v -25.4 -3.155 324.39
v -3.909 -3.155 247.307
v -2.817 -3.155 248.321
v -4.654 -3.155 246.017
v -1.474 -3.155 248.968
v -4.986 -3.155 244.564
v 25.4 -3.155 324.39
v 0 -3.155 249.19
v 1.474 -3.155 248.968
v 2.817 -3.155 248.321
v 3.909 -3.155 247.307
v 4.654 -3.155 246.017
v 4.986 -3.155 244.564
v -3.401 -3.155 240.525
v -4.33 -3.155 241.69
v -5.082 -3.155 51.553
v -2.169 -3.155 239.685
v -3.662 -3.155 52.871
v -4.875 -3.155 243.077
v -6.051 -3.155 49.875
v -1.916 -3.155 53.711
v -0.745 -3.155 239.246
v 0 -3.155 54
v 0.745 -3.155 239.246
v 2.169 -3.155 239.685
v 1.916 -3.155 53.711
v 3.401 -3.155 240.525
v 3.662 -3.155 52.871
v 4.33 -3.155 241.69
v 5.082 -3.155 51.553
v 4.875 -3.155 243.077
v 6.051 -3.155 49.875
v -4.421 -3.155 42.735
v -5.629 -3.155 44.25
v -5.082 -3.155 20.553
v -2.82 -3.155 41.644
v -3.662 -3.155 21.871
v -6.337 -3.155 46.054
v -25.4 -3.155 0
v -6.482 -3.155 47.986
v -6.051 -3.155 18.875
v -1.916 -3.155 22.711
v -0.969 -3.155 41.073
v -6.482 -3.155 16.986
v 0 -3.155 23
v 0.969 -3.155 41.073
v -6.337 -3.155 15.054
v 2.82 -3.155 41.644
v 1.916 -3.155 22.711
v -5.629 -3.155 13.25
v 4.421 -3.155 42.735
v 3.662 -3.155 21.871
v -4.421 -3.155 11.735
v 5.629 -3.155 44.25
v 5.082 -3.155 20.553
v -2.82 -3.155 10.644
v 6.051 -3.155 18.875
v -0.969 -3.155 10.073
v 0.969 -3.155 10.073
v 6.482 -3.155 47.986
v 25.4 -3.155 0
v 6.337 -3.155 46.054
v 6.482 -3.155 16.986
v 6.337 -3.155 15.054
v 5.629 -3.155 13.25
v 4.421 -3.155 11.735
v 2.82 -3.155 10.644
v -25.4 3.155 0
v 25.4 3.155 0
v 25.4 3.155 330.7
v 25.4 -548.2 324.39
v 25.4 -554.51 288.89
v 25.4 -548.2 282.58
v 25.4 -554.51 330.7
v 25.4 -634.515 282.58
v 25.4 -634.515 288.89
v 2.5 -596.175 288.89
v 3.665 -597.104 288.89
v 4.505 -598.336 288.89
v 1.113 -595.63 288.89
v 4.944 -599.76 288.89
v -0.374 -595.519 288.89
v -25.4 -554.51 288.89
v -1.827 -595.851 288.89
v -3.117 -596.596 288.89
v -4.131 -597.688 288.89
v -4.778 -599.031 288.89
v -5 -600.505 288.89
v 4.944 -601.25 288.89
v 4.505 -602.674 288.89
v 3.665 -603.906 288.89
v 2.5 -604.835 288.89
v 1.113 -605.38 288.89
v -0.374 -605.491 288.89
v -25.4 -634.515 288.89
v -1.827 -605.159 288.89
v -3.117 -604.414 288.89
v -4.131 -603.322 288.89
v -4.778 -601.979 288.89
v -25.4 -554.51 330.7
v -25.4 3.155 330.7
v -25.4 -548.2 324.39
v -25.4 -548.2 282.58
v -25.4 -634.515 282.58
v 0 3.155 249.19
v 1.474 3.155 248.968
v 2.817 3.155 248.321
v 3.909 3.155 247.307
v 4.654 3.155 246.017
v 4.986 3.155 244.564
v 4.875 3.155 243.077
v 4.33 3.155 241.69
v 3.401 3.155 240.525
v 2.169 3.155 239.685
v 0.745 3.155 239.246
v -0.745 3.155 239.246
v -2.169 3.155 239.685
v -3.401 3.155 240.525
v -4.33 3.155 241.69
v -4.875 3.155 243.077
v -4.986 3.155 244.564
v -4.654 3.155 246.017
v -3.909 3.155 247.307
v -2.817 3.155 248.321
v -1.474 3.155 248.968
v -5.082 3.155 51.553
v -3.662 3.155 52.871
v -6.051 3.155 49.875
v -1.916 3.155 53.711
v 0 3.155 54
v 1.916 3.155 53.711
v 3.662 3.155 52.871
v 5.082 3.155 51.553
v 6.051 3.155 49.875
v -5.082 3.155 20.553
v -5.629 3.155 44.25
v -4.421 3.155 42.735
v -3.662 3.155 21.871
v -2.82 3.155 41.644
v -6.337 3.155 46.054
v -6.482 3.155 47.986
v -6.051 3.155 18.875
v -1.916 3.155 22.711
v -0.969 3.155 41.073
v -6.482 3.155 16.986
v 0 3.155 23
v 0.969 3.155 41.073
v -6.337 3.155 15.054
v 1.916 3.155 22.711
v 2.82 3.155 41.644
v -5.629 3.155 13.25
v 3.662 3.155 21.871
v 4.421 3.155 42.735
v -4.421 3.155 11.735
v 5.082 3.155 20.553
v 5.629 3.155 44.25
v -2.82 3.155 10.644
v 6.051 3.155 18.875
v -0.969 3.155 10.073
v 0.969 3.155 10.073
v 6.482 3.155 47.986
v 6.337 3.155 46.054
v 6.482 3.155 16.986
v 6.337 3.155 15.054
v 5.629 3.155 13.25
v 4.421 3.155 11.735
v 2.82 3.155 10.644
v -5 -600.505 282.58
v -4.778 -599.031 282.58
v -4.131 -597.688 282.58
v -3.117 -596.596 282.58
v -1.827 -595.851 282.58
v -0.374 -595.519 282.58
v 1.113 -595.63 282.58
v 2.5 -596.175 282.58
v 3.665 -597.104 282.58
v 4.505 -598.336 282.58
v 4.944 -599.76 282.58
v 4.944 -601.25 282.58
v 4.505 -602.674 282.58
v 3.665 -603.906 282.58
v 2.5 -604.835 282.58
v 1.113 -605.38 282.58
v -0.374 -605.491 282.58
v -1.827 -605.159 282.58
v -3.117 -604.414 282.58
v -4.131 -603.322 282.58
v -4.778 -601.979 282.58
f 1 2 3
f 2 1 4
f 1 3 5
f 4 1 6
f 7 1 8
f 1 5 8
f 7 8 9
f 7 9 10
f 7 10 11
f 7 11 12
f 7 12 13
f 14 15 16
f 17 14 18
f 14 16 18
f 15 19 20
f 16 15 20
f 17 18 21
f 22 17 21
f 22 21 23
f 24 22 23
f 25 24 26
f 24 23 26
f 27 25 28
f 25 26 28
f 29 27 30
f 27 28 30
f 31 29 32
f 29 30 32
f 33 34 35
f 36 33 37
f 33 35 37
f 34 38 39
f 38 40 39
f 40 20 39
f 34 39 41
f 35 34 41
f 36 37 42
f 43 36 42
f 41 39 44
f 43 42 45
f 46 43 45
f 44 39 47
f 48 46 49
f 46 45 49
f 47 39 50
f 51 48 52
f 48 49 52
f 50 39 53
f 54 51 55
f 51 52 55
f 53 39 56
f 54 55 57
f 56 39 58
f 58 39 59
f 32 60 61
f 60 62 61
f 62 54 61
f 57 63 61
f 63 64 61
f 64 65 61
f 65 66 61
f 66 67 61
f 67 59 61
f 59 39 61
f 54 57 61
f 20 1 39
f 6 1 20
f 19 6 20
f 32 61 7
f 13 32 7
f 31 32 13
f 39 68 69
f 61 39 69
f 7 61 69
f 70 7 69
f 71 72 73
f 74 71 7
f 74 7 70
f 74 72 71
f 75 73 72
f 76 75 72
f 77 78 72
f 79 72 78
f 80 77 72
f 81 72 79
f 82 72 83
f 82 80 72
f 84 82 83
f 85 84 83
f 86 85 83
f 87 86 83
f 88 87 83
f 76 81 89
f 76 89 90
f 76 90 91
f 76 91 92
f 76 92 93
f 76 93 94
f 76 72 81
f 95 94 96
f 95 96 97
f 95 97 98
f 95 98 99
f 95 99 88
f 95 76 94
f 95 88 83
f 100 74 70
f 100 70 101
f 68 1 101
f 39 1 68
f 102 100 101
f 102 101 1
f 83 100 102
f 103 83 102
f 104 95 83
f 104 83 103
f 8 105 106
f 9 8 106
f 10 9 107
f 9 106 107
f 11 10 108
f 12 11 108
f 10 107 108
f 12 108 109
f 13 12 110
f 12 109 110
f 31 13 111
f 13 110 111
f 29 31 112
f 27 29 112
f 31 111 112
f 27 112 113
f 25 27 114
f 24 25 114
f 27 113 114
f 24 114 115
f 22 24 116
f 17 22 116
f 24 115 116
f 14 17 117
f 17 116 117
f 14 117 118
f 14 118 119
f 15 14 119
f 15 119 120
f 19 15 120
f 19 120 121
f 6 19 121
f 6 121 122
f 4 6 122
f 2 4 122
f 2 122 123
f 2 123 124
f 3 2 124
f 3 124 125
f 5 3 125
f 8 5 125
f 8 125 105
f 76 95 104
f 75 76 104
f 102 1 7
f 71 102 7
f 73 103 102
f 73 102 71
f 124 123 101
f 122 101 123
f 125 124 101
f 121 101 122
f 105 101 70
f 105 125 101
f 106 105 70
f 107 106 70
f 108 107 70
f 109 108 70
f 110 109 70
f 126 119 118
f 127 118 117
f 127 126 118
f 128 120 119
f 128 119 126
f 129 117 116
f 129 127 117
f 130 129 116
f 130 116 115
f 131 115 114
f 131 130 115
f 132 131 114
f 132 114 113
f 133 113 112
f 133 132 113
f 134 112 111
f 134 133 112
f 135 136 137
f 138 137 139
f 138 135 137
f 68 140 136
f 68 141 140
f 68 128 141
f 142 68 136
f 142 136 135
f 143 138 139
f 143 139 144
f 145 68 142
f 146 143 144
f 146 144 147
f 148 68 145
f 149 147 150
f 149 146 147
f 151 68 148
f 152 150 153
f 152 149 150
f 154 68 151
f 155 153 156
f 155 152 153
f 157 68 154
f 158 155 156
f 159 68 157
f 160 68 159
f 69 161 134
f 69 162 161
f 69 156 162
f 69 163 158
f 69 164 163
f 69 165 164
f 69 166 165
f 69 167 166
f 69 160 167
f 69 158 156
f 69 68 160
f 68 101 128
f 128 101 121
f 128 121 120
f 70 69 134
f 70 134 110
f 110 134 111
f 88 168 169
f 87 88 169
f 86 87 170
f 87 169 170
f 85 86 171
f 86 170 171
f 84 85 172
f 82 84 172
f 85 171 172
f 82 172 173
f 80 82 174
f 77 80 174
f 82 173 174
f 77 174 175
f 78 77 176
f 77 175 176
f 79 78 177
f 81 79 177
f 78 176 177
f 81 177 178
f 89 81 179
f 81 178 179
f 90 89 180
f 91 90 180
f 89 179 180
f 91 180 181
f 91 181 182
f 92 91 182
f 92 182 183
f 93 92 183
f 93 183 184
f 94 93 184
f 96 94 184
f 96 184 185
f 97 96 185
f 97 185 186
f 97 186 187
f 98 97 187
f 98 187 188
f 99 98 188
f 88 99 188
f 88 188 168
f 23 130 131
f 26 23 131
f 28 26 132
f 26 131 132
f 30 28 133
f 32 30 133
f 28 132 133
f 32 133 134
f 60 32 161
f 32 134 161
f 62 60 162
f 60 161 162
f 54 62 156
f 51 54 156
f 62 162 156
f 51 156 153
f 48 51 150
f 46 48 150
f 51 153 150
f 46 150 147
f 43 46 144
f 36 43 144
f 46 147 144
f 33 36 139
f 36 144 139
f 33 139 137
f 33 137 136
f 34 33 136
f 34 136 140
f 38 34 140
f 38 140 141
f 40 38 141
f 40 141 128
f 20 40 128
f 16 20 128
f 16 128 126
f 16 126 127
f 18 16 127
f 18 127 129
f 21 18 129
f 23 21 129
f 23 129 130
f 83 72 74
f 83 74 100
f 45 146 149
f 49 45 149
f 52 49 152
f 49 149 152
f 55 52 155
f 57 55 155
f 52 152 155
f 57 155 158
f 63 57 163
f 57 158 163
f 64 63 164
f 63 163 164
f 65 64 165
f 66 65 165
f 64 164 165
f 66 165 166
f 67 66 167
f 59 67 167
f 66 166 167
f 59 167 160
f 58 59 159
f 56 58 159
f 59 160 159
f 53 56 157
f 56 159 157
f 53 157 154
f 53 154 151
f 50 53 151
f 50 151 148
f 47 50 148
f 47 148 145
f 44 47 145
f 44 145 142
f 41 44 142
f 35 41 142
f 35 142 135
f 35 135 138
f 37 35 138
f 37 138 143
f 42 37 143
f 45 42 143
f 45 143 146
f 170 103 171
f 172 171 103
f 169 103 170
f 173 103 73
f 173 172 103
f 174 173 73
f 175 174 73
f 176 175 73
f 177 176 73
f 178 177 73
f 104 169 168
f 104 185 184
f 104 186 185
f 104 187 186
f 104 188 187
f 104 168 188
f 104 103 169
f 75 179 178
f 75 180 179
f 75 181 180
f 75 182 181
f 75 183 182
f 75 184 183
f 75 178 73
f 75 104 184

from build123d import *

# Parameters (mm, degrees)
CROQUIS1_W              = 50.8
CROQUIS1_H              = 6.31
SALIENTE_EXTRUIR1_DEPTH = 330.7
CROQUIS3_W              = 50.8
CROQUIS3_H              = 6.31
SALIENTE_EXTRUIR2_DEPTH = 538.2
CROQUIS7_W              = 50.8
CROQUIS7_H              = 6.31
CROQUIS8_R              = 5
CORTAR_EXTRUIR2_DEPTH   = 15.875
CROQUIS9_R              = 6.5
CORTAR_EXTRUIR3_DEPTH   = 15.875
CROQUIS11_R             = 5
CORTAR_EXTRUIR5_DEPTH   = 10


with BuildPart() as part:
    # Croquis1 → Saliente-Extruir1 (new body)
    with BuildSketch(Plane.XY):
        Rectangle(CROQUIS1_W, CROQUIS1_H)
    extrude(amount=SALIENTE_EXTRUIR1_DEPTH)

    # Croquis3 → Saliente-Extruir2 (add)
    with BuildSketch(Plane.XZ.offset(3.155)):
        with Locations((0, 327.545)):
            Rectangle(CROQUIS3_W, CROQUIS3_H)
    extrude(amount=SALIENTE_EXTRUIR2_DEPTH)

    # Barrer1: sweep along a curve in space
    with BuildLine() as barrer1_path:
        Line((0, -541.355, 327.545), (0, -551.355, 327.545))
        Line((0, -551.355, 327.545), (0, -551.355, 285.735))
        Line((0, -551.355, 285.735), (0, -634.515, 285.735))
    # Croquis7 → Barrer1 (sweep)
    with BuildSketch(Plane.XZ.offset(541.355)):
        with Locations((0, 327.545)):
            Rectangle(CROQUIS7_W, CROQUIS7_H)
    sweep(path=barrer1_path.line, transition=Transition.RIGHT)

    # Croquis8 → Cortar-Extruir2 (cut)
    with BuildSketch(Plane(origin=(0, 0, 282.58), x_dir=(-1, 0, 0), z_dir=(0, 0, -1))):
        with Locations((0, -600.505)):
            Circle(CROQUIS8_R)
    extrude(amount=-CORTAR_EXTRUIR2_DEPTH, mode=Mode.SUBTRACT)

    # Croquis9 → Cortar-Extruir3 (cut)
    with BuildSketch(Plane(origin=(0, 3.155, 0), x_dir=(1, 0, 0), z_dir=(0, 1, 0))):
        with Locations(Location((0, -47.5, 0), (0, 0, 270))):
            Circle(CROQUIS9_R)
        with Locations(Location((0, -16.5, 0), (0, 0, 270))):
            Circle(CROQUIS9_R)
    extrude(amount=-CORTAR_EXTRUIR3_DEPTH, mode=Mode.SUBTRACT)

    # Croquis11 → Cortar-Extruir5 (cut)
    with BuildSketch(Plane(origin=(0, 3.155, 0), x_dir=(1, 0, 0), z_dir=(0, 1, 0))):
        with Locations(Location((0, -244.19, 0), (0, 0, 270))):
            Circle(CROQUIS11_R)
    extrude(amount=-CORTAR_EXTRUIR5_DEPTH, mode=Mode.SUBTRACT)


solid = part.part
